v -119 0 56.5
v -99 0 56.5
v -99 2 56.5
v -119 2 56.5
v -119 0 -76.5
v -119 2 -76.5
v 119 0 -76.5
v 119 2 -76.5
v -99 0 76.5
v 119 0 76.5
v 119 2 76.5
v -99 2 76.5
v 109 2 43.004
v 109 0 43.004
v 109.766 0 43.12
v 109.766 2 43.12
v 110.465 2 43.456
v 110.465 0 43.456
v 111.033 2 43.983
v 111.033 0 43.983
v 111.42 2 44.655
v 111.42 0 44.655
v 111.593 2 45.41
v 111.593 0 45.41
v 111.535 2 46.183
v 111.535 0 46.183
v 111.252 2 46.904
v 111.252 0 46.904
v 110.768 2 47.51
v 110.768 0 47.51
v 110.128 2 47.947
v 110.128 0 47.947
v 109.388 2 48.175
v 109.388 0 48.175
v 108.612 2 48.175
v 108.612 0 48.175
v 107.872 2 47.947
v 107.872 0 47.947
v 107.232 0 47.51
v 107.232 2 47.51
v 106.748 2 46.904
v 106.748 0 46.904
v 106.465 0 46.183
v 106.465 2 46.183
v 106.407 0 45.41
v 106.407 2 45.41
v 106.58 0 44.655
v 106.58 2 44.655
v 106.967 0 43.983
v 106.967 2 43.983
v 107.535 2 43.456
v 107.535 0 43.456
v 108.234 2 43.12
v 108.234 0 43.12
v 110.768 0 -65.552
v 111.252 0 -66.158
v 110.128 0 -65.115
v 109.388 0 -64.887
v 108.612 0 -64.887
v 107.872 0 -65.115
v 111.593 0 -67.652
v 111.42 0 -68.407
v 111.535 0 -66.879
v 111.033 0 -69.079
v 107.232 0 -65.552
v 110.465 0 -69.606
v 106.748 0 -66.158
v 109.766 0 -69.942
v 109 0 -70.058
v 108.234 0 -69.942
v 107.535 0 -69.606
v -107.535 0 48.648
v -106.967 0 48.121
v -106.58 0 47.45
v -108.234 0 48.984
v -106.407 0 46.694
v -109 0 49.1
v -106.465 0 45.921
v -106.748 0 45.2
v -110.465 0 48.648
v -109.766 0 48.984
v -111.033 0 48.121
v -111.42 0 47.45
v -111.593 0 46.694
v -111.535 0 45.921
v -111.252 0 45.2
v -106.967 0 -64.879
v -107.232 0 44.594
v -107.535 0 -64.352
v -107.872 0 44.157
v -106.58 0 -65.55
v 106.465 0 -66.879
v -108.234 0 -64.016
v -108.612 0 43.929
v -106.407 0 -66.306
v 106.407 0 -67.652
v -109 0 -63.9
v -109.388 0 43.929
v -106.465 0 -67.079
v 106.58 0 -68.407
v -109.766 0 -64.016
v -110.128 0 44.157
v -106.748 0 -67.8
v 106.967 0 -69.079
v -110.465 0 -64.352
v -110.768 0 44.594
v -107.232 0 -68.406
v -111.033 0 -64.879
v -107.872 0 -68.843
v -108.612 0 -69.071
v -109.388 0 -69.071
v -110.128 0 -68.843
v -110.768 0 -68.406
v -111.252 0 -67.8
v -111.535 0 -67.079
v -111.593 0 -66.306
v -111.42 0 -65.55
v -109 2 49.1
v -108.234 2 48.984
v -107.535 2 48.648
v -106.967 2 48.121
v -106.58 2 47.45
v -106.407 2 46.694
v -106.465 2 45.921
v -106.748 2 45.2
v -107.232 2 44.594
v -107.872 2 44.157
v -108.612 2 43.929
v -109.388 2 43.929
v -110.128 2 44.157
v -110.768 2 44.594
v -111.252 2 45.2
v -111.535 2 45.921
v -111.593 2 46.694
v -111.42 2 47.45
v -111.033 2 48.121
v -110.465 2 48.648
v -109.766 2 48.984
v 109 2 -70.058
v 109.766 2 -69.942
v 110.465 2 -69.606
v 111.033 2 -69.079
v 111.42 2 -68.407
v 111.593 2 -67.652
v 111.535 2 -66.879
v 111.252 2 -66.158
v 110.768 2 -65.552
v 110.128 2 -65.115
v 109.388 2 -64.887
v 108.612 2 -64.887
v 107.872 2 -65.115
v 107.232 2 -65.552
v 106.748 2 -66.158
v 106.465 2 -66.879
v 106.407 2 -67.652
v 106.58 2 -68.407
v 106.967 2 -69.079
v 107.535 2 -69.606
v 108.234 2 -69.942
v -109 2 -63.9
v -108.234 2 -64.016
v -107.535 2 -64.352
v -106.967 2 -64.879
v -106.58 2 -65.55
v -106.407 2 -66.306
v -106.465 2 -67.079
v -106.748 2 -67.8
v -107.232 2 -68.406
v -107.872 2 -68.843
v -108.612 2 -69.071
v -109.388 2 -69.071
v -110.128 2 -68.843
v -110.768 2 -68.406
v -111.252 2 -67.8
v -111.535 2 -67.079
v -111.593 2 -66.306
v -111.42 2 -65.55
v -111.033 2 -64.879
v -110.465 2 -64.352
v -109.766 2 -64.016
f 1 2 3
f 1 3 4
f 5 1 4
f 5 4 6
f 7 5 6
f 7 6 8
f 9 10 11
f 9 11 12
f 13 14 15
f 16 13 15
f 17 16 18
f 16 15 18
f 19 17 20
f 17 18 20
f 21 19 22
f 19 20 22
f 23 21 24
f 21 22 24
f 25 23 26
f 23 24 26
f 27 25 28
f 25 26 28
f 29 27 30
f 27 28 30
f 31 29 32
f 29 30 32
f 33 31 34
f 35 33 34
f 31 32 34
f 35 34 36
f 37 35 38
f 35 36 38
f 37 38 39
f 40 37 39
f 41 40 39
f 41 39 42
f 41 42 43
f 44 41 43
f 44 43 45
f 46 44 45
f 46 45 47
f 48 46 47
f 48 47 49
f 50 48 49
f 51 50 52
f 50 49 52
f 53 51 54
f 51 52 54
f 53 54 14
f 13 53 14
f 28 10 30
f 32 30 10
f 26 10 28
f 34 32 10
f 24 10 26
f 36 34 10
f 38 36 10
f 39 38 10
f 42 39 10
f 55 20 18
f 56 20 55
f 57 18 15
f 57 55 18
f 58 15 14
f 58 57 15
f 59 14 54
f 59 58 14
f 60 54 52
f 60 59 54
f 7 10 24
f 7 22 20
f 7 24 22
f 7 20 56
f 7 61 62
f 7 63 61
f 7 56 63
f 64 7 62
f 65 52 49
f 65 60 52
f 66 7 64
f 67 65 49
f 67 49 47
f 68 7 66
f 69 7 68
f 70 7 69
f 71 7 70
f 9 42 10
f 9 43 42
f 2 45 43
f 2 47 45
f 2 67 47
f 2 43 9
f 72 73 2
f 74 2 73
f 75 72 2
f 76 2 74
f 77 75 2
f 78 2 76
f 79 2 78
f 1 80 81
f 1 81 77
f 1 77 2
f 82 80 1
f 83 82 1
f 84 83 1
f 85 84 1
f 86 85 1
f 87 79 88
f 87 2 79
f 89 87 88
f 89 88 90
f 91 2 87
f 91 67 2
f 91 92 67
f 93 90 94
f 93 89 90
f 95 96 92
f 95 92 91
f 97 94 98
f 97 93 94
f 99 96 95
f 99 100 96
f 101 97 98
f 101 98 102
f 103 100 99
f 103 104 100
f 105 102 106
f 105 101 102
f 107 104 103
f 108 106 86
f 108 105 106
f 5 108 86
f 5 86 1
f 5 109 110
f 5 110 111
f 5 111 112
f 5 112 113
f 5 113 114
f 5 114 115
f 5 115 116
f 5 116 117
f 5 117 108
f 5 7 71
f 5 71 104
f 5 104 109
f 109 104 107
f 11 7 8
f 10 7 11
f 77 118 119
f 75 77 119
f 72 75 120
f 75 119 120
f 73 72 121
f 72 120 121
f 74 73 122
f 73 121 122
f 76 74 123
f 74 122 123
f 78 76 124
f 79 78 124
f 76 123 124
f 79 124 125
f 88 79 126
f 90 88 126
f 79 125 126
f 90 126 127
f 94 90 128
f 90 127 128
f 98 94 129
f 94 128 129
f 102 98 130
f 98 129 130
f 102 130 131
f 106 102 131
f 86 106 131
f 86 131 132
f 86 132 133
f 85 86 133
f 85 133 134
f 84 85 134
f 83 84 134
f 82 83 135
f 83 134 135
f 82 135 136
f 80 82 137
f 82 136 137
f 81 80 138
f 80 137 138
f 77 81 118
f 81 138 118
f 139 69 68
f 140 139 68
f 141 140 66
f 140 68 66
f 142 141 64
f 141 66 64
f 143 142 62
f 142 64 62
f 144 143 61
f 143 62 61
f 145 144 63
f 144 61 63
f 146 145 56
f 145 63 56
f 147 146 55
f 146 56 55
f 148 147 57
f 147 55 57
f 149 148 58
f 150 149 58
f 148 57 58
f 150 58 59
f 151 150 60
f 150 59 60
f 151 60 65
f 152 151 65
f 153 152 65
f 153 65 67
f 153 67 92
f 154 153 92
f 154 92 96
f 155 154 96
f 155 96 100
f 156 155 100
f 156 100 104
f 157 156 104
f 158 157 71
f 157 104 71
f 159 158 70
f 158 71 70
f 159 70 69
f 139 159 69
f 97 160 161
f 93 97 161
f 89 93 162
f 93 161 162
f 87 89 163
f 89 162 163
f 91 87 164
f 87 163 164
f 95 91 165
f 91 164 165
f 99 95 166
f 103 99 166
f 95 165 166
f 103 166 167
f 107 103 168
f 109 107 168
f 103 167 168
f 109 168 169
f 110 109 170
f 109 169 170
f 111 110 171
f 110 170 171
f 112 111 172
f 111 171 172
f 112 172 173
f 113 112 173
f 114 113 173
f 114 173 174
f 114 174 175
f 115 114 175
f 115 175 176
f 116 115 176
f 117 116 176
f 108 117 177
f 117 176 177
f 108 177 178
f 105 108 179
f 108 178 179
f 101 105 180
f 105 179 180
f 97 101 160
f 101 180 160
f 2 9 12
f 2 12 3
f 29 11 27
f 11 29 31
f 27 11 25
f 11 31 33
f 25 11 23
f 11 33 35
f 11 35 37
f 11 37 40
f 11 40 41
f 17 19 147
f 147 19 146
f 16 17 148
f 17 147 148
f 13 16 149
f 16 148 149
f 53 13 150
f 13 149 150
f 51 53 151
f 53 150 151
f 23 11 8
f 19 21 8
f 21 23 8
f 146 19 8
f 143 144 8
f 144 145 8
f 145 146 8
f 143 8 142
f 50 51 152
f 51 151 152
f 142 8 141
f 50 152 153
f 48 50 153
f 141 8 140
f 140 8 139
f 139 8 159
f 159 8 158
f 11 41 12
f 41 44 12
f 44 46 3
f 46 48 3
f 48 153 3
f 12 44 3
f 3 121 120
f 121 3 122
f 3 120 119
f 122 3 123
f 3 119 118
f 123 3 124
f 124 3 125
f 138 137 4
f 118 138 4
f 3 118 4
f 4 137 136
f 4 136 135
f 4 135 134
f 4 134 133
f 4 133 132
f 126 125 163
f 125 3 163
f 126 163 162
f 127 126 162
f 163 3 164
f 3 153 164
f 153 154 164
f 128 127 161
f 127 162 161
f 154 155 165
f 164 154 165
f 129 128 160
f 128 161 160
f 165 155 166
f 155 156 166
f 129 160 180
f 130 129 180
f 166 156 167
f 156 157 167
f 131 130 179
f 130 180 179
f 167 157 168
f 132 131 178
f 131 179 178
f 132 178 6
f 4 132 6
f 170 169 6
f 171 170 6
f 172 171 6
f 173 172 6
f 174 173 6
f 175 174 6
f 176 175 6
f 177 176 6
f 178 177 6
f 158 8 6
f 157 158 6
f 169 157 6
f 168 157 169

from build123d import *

# Parameters (mm, degrees)
P_IDAT_VYSUNUT_M1_DEPTH  = 2
SKICA2_R                 = 2.6
ODEBRAT_VYSUNUT_M1_DEPTH = 2
SKICA3_R                 = 2.6
ODEBRAT_VYSUNUT_M2_DEPTH = 2


with BuildPart() as part:
    # Skica1 → Přidat vysunutím1 (new body)
    with BuildSketch(Plane(origin=(0, 0, 0), x_dir=(1, 0, 0), z_dir=(0, 1, 0))):
        Polygon((119, -76.5), (-99, -76.5), (-99, -56.5), (-119, -56.5), (-119, 76.5), (119, 76.5), align=None)
    extrude(amount=P_IDAT_VYSUNUT_M1_DEPTH)

    # Skica2 → Odebrat vysunutím1 (cut)
    with BuildSketch(Plane.XZ):
        with Locations(Location((109, 45.604467717, 0), (0, 0, 270))):
            Circle(SKICA2_R)
        with Locations(Location((109, -67.457548012, 0), (0, 0, 270))):
            Circle(SKICA2_R)
    extrude(amount=-ODEBRAT_VYSUNUT_M1_DEPTH, mode=Mode.SUBTRACT)

    # Skica3 → Odebrat vysunutím2 (cut)
    with BuildSketch(Plane(origin=(0, 2, 0), x_dir=(1, 0, 0), z_dir=(0, 1, 0))):
        with Locations(Location((-109, 66.5, 0), (0, 0, 270))):
            Circle(SKICA3_R)
        with Locations(Location((-109, -46.5, 0), (0, 0, 270))):
            Circle(SKICA3_R)
    extrude(amount=-ODEBRAT_VYSUNUT_M2_DEPTH, mode=Mode.SUBTRACT)


solid = part.part
